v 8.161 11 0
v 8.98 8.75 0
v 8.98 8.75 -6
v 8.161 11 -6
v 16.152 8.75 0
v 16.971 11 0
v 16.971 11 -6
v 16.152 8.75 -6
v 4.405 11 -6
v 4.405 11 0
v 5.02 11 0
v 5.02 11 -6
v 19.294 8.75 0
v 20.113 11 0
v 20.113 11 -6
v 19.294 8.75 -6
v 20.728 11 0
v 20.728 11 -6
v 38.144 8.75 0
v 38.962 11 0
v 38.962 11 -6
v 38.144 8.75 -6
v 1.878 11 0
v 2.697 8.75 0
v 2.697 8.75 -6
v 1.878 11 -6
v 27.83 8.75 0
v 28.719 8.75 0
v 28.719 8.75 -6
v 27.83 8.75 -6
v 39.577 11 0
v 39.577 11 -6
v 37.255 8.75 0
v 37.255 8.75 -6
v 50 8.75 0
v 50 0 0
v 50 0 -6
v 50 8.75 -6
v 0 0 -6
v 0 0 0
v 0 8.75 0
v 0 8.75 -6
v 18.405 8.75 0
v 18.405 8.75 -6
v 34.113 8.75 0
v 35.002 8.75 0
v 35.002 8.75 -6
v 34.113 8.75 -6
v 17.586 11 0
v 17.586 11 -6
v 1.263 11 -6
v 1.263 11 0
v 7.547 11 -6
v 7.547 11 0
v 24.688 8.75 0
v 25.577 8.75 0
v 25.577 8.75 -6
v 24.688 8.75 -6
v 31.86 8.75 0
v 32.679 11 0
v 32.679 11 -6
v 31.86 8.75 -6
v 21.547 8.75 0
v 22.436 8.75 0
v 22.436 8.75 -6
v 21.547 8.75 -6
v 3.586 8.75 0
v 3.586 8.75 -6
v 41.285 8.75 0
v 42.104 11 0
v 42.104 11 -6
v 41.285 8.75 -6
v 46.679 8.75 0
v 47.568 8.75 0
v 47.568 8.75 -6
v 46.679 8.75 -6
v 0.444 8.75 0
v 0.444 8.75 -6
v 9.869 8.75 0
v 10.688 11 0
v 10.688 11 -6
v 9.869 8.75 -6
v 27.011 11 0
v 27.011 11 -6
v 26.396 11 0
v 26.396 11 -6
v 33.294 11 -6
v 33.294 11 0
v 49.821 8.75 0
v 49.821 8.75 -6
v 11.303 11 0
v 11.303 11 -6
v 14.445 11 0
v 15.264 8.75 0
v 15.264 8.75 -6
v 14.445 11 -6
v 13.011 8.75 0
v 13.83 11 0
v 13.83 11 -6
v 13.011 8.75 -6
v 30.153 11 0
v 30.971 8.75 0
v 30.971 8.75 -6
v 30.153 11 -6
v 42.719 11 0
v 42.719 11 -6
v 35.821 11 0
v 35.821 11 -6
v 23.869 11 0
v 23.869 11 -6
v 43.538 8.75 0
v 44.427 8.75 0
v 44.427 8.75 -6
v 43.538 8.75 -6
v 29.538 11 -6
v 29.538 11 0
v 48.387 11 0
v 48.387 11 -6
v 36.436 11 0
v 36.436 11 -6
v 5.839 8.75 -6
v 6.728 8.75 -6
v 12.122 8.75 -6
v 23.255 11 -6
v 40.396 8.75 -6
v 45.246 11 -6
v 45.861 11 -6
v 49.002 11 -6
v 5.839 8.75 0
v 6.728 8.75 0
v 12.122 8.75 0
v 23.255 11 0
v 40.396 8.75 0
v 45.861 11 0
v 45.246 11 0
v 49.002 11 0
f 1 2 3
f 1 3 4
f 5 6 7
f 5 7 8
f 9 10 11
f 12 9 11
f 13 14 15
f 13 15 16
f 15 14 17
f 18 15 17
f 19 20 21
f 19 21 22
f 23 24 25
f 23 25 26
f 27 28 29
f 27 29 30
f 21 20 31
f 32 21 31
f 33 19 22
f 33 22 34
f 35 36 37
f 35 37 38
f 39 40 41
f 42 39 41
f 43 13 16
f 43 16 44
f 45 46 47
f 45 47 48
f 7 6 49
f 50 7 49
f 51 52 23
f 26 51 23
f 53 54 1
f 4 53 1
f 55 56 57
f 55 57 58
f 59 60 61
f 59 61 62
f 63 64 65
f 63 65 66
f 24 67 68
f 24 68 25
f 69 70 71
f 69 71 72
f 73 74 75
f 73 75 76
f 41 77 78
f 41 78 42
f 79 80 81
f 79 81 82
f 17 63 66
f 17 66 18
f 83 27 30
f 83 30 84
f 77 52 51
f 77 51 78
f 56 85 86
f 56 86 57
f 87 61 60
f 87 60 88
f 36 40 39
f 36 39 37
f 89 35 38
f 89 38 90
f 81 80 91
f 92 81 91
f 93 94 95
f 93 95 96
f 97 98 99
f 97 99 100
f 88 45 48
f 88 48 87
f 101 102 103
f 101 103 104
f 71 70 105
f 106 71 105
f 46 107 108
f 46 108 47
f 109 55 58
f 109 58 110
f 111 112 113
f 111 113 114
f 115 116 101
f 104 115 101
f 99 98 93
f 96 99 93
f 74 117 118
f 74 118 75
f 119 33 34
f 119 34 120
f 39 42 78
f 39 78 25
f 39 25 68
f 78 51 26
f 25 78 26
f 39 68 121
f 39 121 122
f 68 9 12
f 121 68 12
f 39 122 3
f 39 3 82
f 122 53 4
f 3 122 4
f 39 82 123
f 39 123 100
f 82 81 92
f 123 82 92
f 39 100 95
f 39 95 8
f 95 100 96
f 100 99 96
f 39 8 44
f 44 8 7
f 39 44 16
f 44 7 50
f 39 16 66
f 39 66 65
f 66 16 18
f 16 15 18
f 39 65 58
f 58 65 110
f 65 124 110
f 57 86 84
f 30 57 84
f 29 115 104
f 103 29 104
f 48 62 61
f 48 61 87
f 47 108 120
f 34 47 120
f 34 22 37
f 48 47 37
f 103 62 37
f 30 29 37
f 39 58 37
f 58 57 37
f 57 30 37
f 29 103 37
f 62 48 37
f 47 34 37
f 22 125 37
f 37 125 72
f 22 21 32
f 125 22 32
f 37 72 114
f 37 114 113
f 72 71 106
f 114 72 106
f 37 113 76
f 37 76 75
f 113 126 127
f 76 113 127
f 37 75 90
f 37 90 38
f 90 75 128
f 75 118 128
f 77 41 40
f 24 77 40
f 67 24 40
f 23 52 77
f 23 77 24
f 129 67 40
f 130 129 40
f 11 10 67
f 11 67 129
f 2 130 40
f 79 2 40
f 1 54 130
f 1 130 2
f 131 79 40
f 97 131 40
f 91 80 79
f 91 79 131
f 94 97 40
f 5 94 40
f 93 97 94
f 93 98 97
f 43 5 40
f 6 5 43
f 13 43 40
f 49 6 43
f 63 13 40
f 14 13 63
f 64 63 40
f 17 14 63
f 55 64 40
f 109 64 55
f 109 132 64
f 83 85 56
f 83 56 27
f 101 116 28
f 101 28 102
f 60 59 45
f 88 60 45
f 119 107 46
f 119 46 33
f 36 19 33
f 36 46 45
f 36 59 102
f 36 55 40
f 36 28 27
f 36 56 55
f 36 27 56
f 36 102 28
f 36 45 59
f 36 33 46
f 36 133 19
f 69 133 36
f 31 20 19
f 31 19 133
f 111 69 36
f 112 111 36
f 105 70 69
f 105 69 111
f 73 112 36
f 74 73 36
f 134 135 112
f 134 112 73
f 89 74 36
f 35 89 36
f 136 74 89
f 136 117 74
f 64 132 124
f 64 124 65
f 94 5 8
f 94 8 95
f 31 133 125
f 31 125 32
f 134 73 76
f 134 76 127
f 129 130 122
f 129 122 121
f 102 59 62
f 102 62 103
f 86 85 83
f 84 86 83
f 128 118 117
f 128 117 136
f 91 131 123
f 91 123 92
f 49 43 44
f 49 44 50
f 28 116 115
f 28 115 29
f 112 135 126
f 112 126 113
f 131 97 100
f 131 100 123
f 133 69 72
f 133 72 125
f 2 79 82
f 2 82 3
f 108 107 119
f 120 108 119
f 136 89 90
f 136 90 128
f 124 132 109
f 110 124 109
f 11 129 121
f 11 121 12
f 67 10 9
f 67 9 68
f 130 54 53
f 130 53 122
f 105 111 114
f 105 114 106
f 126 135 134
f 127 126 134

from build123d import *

# Parameters (mm, degrees)
BLANKSKE_W        = 50
BLANKSKE_H        = 11
BLANK_DEPTH       = 6
TOOTHCUTSIM_DEPTH = 52.546095875
TEETHCUTS_COUNT   = 17
TEETHCUTS_PITCH   = 3.14159265


with BuildPart() as part:
    # BlankSke → Blank (new body)
    with BuildSketch(Plane.XY):
        with Locations((25, 5.5)):
            Rectangle(BLANKSKE_W, BLANKSKE_H)
    extrude(amount=-BLANK_DEPTH)

    # TooCutSkeSim → ToothCutSim (cut, through all)
    with BuildSketch(Plane.XY):
        Polygon((0.44443537, 8.75), (-0.44443537, 8.75), (-1.272613241, 11.0254), (1.272613241, 11.0254), align=None)
    toothcutsim = extrude(amount=-TOOTHCUTSIM_DEPTH, mode=Mode.SUBTRACT)

    # TeethCuts: ToothCutSim ×17
    with Locations(*[(i * TEETHCUTS_PITCH, 0, 0) for i in range(1, TEETHCUTS_COUNT)]):
        add(toothcutsim, mode=Mode.SUBTRACT)


solid = part.part
